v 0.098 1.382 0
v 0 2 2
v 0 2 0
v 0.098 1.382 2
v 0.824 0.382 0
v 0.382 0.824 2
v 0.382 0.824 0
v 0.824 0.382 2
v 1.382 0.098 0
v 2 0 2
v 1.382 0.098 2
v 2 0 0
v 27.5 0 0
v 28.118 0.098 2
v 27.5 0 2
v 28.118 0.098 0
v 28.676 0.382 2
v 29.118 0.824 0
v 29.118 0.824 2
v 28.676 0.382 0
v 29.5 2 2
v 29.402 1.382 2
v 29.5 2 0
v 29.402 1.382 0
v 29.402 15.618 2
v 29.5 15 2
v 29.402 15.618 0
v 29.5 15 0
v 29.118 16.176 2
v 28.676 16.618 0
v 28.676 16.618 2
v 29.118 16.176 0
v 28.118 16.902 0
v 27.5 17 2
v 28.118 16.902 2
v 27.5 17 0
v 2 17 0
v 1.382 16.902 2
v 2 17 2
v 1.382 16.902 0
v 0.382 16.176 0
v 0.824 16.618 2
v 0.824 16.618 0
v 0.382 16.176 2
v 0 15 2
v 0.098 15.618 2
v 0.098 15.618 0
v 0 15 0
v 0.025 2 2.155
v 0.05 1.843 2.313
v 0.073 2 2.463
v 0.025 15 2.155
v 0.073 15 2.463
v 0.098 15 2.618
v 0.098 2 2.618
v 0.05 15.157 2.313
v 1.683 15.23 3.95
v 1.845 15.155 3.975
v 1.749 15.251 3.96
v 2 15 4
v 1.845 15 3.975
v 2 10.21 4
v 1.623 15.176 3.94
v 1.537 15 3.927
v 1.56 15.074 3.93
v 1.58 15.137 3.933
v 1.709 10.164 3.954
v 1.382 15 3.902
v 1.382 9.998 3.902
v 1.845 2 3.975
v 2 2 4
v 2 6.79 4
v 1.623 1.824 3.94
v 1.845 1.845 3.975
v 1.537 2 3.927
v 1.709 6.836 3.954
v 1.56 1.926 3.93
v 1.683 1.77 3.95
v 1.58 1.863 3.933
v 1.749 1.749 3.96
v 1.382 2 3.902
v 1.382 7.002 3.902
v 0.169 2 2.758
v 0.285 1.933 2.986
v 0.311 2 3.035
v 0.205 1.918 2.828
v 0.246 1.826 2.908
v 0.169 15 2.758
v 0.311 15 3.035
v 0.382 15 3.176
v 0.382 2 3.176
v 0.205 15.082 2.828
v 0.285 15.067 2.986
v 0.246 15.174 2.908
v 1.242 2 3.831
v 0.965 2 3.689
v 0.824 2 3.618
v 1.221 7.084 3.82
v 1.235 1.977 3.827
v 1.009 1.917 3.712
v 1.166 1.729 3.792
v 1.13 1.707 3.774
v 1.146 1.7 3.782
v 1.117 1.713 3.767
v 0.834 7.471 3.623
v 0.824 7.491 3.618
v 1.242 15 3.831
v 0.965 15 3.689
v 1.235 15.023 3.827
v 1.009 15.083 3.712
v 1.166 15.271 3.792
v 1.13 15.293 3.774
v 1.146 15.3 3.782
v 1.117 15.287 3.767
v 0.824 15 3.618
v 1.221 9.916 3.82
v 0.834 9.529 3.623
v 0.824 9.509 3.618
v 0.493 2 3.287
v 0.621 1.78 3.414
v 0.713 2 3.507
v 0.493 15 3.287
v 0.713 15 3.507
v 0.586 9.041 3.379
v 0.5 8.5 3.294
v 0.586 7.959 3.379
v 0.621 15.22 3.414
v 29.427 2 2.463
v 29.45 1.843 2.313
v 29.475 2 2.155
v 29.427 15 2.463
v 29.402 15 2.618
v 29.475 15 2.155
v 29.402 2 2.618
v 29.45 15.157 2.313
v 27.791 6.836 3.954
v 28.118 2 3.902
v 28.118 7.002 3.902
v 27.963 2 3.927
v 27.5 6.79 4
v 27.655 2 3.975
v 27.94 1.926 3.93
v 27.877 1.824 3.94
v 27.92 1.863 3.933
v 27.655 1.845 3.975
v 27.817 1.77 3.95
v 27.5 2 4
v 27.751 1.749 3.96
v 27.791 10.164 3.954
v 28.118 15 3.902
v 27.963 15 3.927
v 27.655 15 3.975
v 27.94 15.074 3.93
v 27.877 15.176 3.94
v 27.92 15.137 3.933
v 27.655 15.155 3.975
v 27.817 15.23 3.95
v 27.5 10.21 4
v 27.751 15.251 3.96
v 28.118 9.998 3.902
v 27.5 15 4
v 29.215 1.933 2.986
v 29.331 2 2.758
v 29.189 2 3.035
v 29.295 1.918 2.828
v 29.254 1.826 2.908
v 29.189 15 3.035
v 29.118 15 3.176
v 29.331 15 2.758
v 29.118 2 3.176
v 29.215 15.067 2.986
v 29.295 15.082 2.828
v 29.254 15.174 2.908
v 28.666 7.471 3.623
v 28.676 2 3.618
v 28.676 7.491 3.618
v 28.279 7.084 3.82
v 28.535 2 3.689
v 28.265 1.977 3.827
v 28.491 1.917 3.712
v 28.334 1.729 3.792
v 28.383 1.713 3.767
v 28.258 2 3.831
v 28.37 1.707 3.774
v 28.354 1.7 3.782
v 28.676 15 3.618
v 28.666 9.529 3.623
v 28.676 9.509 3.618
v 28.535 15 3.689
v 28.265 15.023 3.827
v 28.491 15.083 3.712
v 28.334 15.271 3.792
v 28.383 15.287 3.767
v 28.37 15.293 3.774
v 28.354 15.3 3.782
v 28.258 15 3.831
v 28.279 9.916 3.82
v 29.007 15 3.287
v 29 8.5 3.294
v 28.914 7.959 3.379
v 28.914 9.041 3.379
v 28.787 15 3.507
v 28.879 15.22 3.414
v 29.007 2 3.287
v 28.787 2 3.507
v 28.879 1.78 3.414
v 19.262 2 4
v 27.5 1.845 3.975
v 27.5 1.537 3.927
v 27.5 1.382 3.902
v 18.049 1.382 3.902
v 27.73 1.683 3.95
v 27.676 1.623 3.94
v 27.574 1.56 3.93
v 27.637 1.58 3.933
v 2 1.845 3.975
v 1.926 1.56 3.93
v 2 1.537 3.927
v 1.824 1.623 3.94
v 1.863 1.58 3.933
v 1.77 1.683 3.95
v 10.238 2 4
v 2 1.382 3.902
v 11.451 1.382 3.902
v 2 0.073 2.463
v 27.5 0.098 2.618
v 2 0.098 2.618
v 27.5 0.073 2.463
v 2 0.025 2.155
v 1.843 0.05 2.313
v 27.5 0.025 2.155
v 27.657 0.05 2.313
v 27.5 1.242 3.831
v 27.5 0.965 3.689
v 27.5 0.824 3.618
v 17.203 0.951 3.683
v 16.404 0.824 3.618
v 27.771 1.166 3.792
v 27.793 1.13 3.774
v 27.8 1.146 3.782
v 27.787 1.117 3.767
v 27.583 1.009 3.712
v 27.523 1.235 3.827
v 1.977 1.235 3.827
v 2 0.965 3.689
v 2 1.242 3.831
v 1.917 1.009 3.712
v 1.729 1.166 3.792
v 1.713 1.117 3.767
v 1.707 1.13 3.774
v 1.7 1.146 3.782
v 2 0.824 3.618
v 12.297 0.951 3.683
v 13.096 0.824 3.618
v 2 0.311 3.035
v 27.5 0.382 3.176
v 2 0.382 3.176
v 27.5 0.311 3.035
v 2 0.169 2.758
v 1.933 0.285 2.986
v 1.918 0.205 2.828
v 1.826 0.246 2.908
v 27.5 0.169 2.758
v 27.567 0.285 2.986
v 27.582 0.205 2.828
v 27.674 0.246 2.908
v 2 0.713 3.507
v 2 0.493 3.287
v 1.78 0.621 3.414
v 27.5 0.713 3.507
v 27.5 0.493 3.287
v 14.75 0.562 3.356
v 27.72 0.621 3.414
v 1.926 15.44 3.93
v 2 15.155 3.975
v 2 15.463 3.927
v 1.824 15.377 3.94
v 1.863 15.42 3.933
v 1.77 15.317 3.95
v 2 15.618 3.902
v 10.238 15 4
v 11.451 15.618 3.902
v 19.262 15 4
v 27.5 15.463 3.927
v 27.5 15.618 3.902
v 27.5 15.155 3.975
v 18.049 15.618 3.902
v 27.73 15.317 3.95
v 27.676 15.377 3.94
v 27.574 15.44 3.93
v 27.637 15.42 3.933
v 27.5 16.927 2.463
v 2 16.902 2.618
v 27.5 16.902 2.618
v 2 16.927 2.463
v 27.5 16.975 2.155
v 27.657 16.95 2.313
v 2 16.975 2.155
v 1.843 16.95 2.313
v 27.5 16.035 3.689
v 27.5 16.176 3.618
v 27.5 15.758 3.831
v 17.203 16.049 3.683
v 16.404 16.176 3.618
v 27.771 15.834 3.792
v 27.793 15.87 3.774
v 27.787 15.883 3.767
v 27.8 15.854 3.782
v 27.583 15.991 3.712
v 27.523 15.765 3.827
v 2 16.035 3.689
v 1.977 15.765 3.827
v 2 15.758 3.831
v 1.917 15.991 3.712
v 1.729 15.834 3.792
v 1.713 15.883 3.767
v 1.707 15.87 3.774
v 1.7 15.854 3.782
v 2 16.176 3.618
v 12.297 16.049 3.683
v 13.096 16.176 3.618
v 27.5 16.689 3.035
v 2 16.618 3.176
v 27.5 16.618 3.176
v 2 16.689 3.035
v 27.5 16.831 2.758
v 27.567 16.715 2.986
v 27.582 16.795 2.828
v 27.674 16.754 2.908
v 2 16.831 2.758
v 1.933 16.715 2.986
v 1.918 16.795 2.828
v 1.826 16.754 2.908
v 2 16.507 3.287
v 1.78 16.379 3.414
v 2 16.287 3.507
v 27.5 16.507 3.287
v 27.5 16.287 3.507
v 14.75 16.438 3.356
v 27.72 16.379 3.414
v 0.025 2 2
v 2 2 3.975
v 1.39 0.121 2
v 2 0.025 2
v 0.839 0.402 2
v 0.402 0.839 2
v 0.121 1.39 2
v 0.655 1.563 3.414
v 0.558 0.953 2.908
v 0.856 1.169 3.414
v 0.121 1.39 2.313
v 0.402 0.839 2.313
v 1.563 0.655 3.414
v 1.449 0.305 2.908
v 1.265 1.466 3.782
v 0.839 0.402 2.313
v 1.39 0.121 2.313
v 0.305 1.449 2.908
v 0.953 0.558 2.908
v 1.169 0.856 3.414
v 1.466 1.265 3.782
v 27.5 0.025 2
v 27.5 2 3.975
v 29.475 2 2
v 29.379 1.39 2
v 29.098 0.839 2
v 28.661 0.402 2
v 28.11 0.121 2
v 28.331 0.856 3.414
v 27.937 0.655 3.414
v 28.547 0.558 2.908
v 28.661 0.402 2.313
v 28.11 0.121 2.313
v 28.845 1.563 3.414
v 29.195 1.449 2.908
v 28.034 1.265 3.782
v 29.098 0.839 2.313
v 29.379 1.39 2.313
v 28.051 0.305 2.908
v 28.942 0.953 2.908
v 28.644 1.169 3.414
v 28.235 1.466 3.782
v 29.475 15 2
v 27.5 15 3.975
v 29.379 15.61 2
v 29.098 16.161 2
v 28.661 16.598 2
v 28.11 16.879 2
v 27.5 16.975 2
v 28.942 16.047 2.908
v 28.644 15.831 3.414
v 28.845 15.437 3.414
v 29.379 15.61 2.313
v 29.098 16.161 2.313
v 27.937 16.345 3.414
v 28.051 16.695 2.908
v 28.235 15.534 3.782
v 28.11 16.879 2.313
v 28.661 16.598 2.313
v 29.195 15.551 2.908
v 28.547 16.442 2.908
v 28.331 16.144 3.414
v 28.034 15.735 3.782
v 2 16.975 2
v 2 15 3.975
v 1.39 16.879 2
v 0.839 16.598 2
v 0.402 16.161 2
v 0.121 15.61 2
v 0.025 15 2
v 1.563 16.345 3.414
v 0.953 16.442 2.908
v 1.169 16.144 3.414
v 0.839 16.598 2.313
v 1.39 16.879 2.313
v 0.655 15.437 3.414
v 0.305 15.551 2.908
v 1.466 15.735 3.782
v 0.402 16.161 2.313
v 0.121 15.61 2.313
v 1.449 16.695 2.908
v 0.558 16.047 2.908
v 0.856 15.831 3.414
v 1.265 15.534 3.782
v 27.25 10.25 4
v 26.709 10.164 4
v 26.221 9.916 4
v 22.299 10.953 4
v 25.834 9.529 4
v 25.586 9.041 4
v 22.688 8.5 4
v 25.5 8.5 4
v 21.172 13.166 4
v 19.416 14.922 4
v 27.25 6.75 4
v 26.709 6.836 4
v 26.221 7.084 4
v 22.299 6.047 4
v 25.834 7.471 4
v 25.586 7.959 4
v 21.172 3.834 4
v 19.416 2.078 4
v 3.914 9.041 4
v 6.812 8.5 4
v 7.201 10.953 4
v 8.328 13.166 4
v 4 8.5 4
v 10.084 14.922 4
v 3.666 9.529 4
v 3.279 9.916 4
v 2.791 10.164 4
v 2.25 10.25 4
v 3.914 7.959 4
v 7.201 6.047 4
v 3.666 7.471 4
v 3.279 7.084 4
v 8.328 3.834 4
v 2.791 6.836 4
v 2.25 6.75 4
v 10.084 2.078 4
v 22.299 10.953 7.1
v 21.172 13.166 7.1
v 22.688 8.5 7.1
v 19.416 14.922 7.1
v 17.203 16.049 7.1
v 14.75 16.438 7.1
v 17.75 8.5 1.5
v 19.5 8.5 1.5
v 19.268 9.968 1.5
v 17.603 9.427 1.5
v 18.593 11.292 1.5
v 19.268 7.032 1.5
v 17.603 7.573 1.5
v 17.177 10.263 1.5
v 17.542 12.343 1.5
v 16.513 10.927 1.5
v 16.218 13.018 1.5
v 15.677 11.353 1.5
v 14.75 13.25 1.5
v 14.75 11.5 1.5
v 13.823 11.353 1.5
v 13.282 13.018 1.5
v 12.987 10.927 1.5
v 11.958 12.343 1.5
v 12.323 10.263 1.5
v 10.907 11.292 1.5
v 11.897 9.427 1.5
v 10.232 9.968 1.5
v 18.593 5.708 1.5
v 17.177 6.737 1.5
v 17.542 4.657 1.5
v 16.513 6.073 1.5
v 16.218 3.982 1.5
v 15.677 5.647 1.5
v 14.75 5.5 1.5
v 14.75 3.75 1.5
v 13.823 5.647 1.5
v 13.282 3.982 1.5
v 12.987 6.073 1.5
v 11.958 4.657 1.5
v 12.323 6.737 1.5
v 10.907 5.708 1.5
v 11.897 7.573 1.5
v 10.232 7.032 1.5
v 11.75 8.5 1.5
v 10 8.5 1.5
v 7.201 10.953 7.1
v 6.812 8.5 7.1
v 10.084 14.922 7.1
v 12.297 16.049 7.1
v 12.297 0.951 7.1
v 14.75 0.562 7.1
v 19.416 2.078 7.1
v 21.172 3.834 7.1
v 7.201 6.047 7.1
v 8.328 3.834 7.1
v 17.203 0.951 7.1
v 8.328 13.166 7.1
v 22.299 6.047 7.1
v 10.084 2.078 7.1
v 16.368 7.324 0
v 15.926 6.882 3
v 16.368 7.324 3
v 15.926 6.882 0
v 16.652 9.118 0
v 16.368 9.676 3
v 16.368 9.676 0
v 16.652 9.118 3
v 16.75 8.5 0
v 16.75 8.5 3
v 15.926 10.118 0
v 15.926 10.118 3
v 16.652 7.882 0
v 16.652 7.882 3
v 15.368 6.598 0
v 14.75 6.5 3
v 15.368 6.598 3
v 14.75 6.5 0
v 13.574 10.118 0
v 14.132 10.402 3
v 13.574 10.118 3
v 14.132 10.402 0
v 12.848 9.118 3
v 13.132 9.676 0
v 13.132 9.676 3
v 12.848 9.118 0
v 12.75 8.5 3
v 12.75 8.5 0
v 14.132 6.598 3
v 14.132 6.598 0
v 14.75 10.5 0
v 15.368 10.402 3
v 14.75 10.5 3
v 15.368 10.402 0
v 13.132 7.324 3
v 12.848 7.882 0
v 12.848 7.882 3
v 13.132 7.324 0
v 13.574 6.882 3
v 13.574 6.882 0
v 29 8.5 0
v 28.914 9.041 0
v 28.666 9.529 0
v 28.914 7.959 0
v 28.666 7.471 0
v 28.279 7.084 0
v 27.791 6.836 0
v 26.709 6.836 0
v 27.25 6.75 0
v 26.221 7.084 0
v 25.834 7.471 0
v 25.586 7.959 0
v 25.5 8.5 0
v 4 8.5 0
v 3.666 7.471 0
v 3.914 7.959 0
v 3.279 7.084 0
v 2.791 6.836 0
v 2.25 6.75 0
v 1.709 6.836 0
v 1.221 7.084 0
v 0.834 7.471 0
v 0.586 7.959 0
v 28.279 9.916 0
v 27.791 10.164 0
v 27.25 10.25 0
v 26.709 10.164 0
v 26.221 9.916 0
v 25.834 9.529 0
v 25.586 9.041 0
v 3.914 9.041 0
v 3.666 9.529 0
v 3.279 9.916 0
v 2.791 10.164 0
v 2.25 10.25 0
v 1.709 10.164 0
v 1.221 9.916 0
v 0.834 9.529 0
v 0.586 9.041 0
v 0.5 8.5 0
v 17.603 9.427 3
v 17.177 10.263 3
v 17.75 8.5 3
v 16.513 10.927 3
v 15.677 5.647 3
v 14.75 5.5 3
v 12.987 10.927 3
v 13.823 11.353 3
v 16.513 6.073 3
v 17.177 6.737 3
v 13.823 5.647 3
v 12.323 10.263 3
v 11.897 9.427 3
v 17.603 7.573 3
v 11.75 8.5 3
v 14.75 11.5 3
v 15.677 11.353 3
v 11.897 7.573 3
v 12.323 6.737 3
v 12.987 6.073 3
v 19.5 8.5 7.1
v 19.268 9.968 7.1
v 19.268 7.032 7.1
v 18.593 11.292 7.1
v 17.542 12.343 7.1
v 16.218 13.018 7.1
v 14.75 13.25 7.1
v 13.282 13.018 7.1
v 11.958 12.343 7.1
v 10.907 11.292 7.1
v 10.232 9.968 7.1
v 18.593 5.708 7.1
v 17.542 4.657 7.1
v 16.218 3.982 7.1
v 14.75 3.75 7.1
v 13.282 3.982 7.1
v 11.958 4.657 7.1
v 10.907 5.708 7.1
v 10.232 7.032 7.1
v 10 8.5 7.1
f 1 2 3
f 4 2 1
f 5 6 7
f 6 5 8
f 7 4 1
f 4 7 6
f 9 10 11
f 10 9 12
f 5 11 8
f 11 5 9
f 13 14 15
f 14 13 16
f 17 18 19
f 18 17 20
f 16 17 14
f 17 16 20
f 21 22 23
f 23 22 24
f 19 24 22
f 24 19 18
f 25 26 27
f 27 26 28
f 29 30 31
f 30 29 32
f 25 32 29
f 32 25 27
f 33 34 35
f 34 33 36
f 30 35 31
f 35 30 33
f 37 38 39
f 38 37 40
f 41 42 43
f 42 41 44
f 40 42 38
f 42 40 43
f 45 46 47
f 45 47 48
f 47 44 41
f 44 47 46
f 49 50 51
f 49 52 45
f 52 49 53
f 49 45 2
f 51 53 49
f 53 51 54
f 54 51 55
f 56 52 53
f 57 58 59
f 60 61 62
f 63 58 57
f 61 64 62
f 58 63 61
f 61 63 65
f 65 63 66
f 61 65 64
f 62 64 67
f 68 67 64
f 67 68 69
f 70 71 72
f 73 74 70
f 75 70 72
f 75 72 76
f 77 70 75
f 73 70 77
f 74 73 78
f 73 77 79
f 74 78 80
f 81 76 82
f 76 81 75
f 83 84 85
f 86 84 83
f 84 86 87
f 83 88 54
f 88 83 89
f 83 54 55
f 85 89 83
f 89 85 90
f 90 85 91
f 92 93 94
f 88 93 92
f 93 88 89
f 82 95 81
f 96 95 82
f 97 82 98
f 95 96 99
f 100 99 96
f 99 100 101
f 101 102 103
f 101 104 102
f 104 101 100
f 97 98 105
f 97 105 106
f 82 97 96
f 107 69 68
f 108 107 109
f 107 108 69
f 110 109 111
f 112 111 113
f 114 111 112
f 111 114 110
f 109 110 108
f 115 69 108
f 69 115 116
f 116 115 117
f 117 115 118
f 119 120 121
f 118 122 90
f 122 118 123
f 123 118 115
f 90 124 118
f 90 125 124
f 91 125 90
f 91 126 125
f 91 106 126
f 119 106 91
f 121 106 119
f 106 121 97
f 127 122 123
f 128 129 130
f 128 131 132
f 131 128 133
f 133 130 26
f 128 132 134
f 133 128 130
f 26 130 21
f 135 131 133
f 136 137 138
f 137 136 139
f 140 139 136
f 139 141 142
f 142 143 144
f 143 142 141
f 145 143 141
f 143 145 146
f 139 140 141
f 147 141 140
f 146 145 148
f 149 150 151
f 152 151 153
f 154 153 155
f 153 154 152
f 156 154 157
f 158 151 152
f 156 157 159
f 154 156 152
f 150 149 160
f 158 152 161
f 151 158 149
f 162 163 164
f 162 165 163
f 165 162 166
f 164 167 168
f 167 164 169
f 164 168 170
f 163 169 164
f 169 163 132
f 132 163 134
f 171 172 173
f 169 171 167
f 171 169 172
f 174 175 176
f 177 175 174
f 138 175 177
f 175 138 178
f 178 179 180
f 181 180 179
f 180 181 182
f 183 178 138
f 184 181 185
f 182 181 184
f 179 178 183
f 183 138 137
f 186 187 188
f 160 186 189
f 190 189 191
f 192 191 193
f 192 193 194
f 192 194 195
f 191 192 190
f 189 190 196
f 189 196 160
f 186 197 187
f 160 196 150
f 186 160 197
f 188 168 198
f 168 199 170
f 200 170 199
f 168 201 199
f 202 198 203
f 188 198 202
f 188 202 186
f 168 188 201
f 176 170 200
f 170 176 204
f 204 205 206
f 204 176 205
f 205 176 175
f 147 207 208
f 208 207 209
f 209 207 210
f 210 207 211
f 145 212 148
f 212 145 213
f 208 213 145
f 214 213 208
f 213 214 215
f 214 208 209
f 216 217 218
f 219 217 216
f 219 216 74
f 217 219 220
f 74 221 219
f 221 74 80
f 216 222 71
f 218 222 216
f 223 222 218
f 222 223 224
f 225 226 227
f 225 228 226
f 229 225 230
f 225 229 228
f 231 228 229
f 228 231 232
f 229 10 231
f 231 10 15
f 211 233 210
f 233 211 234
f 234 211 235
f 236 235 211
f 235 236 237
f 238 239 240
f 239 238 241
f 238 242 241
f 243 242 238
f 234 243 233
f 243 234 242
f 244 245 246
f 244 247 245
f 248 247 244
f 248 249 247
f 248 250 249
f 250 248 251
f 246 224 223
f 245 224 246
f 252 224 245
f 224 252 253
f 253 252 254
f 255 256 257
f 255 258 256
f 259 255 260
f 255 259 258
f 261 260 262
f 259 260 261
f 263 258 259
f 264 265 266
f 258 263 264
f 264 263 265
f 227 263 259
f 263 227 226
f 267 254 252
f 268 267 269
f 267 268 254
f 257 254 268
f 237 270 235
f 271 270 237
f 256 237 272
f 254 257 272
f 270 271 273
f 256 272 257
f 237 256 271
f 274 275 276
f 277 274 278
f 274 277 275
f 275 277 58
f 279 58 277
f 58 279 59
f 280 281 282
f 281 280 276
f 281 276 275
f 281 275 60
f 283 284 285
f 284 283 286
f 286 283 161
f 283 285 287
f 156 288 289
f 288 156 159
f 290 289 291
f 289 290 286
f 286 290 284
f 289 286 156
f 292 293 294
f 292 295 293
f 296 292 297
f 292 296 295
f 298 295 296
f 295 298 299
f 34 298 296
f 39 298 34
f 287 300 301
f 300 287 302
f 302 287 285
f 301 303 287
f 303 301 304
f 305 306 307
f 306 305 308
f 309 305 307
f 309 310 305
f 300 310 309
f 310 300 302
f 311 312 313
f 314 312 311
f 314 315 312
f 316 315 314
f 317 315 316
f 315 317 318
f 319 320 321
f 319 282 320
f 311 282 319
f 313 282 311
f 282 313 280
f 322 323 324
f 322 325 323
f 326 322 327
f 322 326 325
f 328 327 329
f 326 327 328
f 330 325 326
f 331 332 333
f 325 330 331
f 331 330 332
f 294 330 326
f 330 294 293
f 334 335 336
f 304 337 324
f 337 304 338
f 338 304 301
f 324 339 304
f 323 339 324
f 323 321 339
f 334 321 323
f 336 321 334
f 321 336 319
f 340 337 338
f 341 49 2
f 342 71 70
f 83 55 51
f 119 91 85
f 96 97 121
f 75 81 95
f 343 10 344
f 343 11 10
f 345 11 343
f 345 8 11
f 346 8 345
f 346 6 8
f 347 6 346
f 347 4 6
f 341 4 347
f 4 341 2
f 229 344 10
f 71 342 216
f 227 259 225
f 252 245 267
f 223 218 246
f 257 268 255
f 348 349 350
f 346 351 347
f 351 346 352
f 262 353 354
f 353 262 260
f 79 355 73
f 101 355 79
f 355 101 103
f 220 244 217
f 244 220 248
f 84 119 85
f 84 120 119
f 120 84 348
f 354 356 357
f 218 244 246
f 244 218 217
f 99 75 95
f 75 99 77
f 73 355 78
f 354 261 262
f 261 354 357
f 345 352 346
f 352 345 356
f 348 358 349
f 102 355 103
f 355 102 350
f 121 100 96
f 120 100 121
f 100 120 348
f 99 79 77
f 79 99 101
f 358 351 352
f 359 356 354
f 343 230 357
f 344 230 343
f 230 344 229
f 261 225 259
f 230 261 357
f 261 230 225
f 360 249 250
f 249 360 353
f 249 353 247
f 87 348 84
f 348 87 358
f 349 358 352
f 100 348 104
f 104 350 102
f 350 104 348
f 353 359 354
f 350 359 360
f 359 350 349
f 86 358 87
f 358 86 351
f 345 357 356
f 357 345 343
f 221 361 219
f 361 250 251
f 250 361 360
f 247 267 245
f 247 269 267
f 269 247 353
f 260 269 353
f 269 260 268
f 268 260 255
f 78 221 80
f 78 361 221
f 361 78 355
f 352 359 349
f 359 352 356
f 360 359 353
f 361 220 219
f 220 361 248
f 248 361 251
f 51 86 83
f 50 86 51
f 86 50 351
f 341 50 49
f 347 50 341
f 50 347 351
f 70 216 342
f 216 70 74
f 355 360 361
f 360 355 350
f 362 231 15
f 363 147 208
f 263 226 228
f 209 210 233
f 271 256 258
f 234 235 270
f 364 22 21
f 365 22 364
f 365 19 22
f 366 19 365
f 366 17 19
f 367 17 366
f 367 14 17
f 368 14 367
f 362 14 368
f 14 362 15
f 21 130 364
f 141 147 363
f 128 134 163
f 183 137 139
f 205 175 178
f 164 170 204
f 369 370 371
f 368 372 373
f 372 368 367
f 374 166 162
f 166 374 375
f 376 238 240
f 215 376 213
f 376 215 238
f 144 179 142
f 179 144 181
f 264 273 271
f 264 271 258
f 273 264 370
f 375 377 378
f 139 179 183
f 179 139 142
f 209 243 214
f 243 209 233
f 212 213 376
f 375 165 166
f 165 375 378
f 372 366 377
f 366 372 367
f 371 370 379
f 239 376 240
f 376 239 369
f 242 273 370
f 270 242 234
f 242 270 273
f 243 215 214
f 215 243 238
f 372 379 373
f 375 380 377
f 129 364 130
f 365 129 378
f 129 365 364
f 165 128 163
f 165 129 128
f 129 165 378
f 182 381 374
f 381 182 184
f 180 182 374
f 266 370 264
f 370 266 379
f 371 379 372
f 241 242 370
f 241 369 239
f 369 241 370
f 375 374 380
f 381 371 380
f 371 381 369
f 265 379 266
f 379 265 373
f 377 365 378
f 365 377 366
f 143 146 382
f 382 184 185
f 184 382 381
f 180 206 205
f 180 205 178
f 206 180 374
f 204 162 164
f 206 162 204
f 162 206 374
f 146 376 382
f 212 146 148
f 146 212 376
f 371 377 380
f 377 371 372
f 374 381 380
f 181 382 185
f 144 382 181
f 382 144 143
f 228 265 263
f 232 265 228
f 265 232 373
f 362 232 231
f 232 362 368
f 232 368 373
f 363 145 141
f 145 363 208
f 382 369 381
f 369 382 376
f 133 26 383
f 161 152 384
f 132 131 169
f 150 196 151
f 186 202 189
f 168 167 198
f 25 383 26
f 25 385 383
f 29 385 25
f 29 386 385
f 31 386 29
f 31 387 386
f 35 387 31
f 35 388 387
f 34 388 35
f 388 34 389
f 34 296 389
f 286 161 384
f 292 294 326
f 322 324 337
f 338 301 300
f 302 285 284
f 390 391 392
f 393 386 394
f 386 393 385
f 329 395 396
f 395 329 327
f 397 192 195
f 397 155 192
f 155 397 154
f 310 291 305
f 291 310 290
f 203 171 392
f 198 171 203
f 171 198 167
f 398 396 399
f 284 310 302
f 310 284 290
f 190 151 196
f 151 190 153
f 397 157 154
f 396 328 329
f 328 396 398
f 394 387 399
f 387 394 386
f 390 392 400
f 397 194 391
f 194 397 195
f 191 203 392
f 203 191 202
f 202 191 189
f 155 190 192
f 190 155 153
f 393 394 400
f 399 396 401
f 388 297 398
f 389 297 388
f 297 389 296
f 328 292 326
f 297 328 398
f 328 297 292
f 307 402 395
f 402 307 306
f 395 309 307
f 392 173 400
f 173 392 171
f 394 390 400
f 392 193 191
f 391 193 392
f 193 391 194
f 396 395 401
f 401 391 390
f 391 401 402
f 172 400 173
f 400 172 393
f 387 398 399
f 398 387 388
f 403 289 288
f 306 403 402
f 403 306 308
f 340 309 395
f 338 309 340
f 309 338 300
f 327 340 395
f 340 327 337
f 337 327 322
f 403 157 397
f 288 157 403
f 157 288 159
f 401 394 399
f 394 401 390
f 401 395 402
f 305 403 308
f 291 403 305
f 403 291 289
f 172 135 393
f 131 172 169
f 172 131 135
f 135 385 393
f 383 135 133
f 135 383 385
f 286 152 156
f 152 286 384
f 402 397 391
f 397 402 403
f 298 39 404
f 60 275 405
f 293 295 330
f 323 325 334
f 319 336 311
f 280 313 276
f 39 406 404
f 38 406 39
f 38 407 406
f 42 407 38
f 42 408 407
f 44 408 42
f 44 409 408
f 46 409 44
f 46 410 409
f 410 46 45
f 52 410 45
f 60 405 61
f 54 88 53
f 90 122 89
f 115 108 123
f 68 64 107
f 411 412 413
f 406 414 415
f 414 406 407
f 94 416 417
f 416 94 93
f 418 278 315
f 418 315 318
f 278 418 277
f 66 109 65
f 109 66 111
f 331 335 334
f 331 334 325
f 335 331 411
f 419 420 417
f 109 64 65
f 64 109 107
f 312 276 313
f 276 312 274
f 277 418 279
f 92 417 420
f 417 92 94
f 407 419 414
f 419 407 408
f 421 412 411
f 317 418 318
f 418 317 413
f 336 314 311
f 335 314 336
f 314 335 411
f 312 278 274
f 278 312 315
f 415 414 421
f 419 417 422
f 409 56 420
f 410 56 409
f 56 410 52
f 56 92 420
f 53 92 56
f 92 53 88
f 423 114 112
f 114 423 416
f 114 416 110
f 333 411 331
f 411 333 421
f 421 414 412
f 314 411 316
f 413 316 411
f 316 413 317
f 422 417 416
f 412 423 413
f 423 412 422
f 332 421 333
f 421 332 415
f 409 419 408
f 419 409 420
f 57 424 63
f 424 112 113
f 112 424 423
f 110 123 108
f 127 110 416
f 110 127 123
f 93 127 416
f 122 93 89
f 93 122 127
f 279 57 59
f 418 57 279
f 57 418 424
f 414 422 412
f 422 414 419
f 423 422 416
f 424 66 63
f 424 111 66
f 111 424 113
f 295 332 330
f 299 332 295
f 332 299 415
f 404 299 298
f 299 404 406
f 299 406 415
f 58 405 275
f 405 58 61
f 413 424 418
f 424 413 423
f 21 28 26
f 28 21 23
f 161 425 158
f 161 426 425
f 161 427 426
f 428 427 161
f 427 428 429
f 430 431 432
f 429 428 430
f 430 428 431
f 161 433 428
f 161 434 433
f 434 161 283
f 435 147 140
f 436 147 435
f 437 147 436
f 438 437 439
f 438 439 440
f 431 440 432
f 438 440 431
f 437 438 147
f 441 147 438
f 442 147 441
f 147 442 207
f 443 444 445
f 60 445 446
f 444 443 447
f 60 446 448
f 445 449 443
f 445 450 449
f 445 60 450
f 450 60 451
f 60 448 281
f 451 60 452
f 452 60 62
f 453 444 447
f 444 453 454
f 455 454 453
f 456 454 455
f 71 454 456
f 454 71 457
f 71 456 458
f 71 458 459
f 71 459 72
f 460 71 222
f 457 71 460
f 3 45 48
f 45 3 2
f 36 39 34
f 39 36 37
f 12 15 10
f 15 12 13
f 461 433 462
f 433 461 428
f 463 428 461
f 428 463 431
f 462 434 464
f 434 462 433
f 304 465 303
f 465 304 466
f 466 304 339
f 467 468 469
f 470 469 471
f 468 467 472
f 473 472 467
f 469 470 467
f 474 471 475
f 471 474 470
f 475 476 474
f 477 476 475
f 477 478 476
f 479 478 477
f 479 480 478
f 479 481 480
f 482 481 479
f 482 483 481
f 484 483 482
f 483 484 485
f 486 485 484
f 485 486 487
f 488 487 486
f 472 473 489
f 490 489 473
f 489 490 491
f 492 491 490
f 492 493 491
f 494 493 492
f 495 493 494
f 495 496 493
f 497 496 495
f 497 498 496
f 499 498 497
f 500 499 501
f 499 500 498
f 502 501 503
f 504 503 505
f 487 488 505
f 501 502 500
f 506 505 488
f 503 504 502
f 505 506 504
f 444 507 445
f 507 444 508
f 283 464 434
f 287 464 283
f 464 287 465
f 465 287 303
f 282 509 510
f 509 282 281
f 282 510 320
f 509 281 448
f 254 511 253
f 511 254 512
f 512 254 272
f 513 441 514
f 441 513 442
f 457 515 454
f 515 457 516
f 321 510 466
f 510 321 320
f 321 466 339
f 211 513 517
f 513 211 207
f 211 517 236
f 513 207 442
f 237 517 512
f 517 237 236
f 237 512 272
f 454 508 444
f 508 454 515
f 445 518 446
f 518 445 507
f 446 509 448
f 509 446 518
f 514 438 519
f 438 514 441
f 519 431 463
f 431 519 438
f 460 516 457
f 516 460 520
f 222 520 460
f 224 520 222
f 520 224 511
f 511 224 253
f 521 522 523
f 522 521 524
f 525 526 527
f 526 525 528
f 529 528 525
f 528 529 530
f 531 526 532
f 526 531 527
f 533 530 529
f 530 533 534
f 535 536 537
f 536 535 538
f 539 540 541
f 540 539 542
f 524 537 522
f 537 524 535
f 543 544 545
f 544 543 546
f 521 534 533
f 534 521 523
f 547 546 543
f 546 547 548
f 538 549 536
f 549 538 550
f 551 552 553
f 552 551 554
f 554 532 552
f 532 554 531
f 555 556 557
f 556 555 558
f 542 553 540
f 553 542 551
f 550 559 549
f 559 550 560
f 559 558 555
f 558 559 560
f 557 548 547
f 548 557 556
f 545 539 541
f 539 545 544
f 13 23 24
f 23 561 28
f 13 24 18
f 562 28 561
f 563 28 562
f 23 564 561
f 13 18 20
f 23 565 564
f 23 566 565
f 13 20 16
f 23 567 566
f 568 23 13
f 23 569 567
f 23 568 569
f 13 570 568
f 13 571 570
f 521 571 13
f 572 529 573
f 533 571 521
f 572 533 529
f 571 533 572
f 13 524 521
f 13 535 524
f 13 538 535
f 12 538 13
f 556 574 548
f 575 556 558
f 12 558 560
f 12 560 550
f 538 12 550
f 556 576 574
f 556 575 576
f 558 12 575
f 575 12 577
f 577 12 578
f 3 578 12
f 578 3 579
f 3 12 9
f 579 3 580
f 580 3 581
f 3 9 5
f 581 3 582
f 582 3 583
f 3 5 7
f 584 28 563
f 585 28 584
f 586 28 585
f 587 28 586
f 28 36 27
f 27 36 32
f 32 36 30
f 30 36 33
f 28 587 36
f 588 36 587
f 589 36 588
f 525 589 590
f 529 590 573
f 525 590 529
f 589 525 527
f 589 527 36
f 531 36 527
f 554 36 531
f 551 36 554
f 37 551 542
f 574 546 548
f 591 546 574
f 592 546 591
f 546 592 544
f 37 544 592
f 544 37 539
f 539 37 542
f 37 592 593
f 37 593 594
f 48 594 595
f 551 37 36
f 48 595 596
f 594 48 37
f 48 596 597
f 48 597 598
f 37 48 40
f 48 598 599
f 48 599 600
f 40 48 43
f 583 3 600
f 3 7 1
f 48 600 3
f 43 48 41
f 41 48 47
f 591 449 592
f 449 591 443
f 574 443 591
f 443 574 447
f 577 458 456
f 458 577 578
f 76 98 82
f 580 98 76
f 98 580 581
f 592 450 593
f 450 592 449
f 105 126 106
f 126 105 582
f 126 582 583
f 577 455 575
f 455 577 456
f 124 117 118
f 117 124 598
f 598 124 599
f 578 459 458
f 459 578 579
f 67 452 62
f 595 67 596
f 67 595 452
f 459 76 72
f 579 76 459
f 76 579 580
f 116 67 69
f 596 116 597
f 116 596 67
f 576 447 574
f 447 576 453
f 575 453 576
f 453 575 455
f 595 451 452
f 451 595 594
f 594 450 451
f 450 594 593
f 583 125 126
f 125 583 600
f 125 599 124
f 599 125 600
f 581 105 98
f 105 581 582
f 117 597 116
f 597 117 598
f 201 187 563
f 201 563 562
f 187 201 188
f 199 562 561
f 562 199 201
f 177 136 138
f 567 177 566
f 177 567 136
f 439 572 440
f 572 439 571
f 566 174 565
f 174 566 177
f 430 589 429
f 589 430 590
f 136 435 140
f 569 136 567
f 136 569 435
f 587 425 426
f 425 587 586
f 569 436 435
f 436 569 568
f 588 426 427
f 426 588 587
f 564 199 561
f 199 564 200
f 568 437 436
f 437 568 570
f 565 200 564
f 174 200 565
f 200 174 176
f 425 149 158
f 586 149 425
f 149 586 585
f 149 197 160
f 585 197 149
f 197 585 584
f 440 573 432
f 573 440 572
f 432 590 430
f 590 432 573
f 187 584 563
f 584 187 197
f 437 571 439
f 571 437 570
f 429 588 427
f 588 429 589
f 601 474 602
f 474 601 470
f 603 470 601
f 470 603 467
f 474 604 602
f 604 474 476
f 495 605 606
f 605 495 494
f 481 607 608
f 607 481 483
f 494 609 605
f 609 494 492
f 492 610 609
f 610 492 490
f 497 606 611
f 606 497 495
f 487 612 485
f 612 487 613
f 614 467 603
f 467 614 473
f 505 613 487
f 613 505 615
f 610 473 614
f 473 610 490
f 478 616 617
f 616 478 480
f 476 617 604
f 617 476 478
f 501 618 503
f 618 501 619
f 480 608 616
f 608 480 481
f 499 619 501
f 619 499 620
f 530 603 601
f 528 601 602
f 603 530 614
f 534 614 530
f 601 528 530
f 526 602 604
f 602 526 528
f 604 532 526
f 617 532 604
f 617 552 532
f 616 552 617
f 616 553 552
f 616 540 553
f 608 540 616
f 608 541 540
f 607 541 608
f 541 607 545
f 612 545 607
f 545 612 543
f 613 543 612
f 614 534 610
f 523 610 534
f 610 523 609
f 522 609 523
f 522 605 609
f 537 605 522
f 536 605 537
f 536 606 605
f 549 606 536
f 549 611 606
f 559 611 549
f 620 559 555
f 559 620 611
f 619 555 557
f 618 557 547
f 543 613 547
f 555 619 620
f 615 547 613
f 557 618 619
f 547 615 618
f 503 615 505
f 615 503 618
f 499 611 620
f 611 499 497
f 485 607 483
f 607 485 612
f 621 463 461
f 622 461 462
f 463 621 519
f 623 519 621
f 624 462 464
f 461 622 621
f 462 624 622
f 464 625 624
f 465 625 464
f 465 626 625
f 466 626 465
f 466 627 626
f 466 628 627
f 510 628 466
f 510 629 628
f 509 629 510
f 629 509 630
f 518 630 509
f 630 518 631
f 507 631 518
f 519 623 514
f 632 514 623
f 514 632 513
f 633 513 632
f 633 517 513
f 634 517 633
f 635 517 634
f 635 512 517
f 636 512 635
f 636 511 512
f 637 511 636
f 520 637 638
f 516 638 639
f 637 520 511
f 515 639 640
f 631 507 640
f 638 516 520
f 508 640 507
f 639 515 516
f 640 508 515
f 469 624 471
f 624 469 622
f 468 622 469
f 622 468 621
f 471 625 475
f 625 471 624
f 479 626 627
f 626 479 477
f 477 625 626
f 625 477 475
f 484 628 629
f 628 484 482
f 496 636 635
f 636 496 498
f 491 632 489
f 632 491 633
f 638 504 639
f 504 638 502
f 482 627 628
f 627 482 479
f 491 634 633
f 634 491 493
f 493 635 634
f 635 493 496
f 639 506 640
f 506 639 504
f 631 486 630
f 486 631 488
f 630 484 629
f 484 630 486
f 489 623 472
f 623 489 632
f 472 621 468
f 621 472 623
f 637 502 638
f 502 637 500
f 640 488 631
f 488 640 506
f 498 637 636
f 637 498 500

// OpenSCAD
// Cube with rounded edges

el = 1e-2;
fn = 20;

module rcorner ( r )
{
   difference() {
      translate ( -el * [ 1, 1, 1 ] ) cube( r + el );
      translate ( [ r, r, r ] ) sphere( r, $fn = fn );
   }
}

module redge ( r, l )
{
   difference() {
      translate ( -2 * el * [ 1, 1, 1 ] ) cube( [ r + 2 * el, r + 2 * el, l + 4 * el ] );
      translate ( [ r, r, -el ] ) cylinder( r = r, h = l + 2 * el, $fn = fn );
   }
}

module rcube( size = 1, center = false, r = 0 )
{
        sz = len( size ) == undef ? [ size, size, size ] : size;

        difference() {
                cube( size = sz );
                union (){
                        // Round the edges:

                        redge( r ,sz[2] );
                        translate( [ sz[0], 0, 0 ] ) rotate( 90, [ 0, 0, 1 ] ) redge( r ,sz[2] );
                        translate( [ sz[0], sz[1], 0 ] ) rotate( 180, [ 0, 0, 1 ] ) redge( r ,sz[2] );
                        translate( [ 0, sz[1], 0 ] ) rotate( 270, [ 0, 0, 1 ] ) redge( r ,sz[2] );

                        translate( [ 0, sz[1], 0 ] ) rotate ( 90, [ 1, 0, 0 ] ) redge( r ,sz[1] );
                        translate( [ 0, 0, sz[2] ] ) rotate ( -90, [ 1, 0, 0 ] ) redge( r ,sz[1] );
                        translate( [ sz[0], 0, 0 ] ) rotate ( 180, [ 0, 1, 1 ] ) redge( r ,sz[1] );
                        translate( [ sz[0], sz[1], sz[2] ] ) rotate ( 180, [ 0, 1, -1 ] ) redge( r ,sz[1] );

                        translate( [ sz[0], 0, 0 ] ) rotate( -90, [ 0, 1, 0 ] )  redge( r ,sz[0] );
                        translate( [ 0, 0, sz[2] ] ) rotate( 90, [ 0, 1, 0 ] )  redge( r ,sz[0] );
                        translate( [ 0, sz[1], 0 ] ) rotate( 180, [ 1, 0, 1 ] )  redge( r ,sz[0] );
                        translate( [ sz[0], sz[1], sz[2] ] ) rotate( 180, [ 1, 0, -1 ] )  redge( r ,sz[0] );

                        // Round the corners:
                        rcorner( r );
                        translate( [ sz[0], 0, 0 ] ) rotate( 90, [ 0, 0, 1 ] ) rcorner( r );
                        translate( [ sz[0], sz[1], 0 ] ) rotate( 180, [ 0, 0, 1 ] ) rcorner( r );
                        translate( [ 0, sz[1], 0 ] ) rotate( 270, [ 0, 0, 1 ] ) rcorner( r );

                        translate( [ 0, 0, sz[2] ] ) rotate( 90, [ 0, 0, 1 ] ) rotate( 180, [ 1, 0, 0 ] ) rcorner( r );
                        translate( [ sz[0], 0, sz[2] ] ) rotate( 180, [ 0, 0, 1 ] ) rotate( 180, [ 1, 0, 0 ] ) rcorner( r );
                        translate( [ sz[0], sz[1], sz[2] ] ) rotate( 270, [ 0, 0, 1 ] ) rotate( 180, [ 1, 0, 0 ] ) rcorner( r );
                        translate( [ 0, sz[1], sz[2] ] ) rotate( 180, [ 1, 0, 0 ] ) rcorner( r );

                }
        }
}

hole_rad = 1.75;

// pf stands for Push-Fit:
pf_hole_dist = 25;
// gm stands for Groove Mount:
gm_attach_width = 27;
pf_attach_width = gm_attach_width - 10;
pf_attach_heigth = 4;
pf_attach_length = pf_hole_dist + 4.5;

// http://reprap.org/wiki/File:Jhn_nozzle_holder_v5.jpg
groove_rad = 15.875 / 2;

pf_screw_rad = 9.5 / 2;

render( convexity = 10 ) {
	union(){
		difference(){
			// Main body:
			translate( [ 0, 0, -5 ] )
				rcube( [ pf_attach_length, pf_attach_width, pf_attach_heigth + 5 ], r = 2 );

			// Remove rounded bottom:
			translate( [ 0, 0, -5.1 ] )
				cube( [ pf_attach_length, pf_attach_width, 5.1 ], r = 2 );

			// Remove push-fit mount space:
			translate( [ pf_attach_length / 2, pf_attach_width / 2, 1.5 ] )
			{
				cylinder( r = groove_rad, h = 5.6, $fn = 20 );
				translate( [ 0, 0, -( pf_attach_heigth / 2 + 0.1 ) ] )
					cylinder( r = 2, 5.6 + 0.1 + pf_attach_heigth / 2 + 0.1, $fn = 20 );
			}

			// Screw holes:
			translate( [ ( pf_attach_length - pf_hole_dist ) / 2, pf_attach_width / 2, -0.1 ] )
				cylinder( h = pf_attach_heigth + 0.2, r = hole_rad, $fn = 20 );
			translate( [ ( pf_attach_length + pf_hole_dist ) / 2, pf_attach_width / 2, -0.1 ] )
				cylinder( h = pf_attach_heigth + 0.2, r = hole_rad, $fn = 20 );
		}

		// Push-fit screw hole:
		translate( [ pf_attach_length / 2, pf_attach_width / 2, 1.5 ] )
			difference(){
				cylinder( r = 3, h = 1.5, $fn =20 );
				translate( [ 0, 0, -0.05 ] )
					cylinder( r = 2, h = 1.5 + 0.1, $fn =20 );
			}

	}
	
	// Push-fit screw:
 	translate( [ pf_attach_length / 2, pf_attach_width / 2, 1.5 ] )
 	{
 		difference(){
 			cylinder( r = groove_rad, h = 5.6, $fn = 20 );
 			cylinder( r = pf_screw_rad, h = 5.6 + 0.1, $fn = 20 );
 		}
 	}
}
